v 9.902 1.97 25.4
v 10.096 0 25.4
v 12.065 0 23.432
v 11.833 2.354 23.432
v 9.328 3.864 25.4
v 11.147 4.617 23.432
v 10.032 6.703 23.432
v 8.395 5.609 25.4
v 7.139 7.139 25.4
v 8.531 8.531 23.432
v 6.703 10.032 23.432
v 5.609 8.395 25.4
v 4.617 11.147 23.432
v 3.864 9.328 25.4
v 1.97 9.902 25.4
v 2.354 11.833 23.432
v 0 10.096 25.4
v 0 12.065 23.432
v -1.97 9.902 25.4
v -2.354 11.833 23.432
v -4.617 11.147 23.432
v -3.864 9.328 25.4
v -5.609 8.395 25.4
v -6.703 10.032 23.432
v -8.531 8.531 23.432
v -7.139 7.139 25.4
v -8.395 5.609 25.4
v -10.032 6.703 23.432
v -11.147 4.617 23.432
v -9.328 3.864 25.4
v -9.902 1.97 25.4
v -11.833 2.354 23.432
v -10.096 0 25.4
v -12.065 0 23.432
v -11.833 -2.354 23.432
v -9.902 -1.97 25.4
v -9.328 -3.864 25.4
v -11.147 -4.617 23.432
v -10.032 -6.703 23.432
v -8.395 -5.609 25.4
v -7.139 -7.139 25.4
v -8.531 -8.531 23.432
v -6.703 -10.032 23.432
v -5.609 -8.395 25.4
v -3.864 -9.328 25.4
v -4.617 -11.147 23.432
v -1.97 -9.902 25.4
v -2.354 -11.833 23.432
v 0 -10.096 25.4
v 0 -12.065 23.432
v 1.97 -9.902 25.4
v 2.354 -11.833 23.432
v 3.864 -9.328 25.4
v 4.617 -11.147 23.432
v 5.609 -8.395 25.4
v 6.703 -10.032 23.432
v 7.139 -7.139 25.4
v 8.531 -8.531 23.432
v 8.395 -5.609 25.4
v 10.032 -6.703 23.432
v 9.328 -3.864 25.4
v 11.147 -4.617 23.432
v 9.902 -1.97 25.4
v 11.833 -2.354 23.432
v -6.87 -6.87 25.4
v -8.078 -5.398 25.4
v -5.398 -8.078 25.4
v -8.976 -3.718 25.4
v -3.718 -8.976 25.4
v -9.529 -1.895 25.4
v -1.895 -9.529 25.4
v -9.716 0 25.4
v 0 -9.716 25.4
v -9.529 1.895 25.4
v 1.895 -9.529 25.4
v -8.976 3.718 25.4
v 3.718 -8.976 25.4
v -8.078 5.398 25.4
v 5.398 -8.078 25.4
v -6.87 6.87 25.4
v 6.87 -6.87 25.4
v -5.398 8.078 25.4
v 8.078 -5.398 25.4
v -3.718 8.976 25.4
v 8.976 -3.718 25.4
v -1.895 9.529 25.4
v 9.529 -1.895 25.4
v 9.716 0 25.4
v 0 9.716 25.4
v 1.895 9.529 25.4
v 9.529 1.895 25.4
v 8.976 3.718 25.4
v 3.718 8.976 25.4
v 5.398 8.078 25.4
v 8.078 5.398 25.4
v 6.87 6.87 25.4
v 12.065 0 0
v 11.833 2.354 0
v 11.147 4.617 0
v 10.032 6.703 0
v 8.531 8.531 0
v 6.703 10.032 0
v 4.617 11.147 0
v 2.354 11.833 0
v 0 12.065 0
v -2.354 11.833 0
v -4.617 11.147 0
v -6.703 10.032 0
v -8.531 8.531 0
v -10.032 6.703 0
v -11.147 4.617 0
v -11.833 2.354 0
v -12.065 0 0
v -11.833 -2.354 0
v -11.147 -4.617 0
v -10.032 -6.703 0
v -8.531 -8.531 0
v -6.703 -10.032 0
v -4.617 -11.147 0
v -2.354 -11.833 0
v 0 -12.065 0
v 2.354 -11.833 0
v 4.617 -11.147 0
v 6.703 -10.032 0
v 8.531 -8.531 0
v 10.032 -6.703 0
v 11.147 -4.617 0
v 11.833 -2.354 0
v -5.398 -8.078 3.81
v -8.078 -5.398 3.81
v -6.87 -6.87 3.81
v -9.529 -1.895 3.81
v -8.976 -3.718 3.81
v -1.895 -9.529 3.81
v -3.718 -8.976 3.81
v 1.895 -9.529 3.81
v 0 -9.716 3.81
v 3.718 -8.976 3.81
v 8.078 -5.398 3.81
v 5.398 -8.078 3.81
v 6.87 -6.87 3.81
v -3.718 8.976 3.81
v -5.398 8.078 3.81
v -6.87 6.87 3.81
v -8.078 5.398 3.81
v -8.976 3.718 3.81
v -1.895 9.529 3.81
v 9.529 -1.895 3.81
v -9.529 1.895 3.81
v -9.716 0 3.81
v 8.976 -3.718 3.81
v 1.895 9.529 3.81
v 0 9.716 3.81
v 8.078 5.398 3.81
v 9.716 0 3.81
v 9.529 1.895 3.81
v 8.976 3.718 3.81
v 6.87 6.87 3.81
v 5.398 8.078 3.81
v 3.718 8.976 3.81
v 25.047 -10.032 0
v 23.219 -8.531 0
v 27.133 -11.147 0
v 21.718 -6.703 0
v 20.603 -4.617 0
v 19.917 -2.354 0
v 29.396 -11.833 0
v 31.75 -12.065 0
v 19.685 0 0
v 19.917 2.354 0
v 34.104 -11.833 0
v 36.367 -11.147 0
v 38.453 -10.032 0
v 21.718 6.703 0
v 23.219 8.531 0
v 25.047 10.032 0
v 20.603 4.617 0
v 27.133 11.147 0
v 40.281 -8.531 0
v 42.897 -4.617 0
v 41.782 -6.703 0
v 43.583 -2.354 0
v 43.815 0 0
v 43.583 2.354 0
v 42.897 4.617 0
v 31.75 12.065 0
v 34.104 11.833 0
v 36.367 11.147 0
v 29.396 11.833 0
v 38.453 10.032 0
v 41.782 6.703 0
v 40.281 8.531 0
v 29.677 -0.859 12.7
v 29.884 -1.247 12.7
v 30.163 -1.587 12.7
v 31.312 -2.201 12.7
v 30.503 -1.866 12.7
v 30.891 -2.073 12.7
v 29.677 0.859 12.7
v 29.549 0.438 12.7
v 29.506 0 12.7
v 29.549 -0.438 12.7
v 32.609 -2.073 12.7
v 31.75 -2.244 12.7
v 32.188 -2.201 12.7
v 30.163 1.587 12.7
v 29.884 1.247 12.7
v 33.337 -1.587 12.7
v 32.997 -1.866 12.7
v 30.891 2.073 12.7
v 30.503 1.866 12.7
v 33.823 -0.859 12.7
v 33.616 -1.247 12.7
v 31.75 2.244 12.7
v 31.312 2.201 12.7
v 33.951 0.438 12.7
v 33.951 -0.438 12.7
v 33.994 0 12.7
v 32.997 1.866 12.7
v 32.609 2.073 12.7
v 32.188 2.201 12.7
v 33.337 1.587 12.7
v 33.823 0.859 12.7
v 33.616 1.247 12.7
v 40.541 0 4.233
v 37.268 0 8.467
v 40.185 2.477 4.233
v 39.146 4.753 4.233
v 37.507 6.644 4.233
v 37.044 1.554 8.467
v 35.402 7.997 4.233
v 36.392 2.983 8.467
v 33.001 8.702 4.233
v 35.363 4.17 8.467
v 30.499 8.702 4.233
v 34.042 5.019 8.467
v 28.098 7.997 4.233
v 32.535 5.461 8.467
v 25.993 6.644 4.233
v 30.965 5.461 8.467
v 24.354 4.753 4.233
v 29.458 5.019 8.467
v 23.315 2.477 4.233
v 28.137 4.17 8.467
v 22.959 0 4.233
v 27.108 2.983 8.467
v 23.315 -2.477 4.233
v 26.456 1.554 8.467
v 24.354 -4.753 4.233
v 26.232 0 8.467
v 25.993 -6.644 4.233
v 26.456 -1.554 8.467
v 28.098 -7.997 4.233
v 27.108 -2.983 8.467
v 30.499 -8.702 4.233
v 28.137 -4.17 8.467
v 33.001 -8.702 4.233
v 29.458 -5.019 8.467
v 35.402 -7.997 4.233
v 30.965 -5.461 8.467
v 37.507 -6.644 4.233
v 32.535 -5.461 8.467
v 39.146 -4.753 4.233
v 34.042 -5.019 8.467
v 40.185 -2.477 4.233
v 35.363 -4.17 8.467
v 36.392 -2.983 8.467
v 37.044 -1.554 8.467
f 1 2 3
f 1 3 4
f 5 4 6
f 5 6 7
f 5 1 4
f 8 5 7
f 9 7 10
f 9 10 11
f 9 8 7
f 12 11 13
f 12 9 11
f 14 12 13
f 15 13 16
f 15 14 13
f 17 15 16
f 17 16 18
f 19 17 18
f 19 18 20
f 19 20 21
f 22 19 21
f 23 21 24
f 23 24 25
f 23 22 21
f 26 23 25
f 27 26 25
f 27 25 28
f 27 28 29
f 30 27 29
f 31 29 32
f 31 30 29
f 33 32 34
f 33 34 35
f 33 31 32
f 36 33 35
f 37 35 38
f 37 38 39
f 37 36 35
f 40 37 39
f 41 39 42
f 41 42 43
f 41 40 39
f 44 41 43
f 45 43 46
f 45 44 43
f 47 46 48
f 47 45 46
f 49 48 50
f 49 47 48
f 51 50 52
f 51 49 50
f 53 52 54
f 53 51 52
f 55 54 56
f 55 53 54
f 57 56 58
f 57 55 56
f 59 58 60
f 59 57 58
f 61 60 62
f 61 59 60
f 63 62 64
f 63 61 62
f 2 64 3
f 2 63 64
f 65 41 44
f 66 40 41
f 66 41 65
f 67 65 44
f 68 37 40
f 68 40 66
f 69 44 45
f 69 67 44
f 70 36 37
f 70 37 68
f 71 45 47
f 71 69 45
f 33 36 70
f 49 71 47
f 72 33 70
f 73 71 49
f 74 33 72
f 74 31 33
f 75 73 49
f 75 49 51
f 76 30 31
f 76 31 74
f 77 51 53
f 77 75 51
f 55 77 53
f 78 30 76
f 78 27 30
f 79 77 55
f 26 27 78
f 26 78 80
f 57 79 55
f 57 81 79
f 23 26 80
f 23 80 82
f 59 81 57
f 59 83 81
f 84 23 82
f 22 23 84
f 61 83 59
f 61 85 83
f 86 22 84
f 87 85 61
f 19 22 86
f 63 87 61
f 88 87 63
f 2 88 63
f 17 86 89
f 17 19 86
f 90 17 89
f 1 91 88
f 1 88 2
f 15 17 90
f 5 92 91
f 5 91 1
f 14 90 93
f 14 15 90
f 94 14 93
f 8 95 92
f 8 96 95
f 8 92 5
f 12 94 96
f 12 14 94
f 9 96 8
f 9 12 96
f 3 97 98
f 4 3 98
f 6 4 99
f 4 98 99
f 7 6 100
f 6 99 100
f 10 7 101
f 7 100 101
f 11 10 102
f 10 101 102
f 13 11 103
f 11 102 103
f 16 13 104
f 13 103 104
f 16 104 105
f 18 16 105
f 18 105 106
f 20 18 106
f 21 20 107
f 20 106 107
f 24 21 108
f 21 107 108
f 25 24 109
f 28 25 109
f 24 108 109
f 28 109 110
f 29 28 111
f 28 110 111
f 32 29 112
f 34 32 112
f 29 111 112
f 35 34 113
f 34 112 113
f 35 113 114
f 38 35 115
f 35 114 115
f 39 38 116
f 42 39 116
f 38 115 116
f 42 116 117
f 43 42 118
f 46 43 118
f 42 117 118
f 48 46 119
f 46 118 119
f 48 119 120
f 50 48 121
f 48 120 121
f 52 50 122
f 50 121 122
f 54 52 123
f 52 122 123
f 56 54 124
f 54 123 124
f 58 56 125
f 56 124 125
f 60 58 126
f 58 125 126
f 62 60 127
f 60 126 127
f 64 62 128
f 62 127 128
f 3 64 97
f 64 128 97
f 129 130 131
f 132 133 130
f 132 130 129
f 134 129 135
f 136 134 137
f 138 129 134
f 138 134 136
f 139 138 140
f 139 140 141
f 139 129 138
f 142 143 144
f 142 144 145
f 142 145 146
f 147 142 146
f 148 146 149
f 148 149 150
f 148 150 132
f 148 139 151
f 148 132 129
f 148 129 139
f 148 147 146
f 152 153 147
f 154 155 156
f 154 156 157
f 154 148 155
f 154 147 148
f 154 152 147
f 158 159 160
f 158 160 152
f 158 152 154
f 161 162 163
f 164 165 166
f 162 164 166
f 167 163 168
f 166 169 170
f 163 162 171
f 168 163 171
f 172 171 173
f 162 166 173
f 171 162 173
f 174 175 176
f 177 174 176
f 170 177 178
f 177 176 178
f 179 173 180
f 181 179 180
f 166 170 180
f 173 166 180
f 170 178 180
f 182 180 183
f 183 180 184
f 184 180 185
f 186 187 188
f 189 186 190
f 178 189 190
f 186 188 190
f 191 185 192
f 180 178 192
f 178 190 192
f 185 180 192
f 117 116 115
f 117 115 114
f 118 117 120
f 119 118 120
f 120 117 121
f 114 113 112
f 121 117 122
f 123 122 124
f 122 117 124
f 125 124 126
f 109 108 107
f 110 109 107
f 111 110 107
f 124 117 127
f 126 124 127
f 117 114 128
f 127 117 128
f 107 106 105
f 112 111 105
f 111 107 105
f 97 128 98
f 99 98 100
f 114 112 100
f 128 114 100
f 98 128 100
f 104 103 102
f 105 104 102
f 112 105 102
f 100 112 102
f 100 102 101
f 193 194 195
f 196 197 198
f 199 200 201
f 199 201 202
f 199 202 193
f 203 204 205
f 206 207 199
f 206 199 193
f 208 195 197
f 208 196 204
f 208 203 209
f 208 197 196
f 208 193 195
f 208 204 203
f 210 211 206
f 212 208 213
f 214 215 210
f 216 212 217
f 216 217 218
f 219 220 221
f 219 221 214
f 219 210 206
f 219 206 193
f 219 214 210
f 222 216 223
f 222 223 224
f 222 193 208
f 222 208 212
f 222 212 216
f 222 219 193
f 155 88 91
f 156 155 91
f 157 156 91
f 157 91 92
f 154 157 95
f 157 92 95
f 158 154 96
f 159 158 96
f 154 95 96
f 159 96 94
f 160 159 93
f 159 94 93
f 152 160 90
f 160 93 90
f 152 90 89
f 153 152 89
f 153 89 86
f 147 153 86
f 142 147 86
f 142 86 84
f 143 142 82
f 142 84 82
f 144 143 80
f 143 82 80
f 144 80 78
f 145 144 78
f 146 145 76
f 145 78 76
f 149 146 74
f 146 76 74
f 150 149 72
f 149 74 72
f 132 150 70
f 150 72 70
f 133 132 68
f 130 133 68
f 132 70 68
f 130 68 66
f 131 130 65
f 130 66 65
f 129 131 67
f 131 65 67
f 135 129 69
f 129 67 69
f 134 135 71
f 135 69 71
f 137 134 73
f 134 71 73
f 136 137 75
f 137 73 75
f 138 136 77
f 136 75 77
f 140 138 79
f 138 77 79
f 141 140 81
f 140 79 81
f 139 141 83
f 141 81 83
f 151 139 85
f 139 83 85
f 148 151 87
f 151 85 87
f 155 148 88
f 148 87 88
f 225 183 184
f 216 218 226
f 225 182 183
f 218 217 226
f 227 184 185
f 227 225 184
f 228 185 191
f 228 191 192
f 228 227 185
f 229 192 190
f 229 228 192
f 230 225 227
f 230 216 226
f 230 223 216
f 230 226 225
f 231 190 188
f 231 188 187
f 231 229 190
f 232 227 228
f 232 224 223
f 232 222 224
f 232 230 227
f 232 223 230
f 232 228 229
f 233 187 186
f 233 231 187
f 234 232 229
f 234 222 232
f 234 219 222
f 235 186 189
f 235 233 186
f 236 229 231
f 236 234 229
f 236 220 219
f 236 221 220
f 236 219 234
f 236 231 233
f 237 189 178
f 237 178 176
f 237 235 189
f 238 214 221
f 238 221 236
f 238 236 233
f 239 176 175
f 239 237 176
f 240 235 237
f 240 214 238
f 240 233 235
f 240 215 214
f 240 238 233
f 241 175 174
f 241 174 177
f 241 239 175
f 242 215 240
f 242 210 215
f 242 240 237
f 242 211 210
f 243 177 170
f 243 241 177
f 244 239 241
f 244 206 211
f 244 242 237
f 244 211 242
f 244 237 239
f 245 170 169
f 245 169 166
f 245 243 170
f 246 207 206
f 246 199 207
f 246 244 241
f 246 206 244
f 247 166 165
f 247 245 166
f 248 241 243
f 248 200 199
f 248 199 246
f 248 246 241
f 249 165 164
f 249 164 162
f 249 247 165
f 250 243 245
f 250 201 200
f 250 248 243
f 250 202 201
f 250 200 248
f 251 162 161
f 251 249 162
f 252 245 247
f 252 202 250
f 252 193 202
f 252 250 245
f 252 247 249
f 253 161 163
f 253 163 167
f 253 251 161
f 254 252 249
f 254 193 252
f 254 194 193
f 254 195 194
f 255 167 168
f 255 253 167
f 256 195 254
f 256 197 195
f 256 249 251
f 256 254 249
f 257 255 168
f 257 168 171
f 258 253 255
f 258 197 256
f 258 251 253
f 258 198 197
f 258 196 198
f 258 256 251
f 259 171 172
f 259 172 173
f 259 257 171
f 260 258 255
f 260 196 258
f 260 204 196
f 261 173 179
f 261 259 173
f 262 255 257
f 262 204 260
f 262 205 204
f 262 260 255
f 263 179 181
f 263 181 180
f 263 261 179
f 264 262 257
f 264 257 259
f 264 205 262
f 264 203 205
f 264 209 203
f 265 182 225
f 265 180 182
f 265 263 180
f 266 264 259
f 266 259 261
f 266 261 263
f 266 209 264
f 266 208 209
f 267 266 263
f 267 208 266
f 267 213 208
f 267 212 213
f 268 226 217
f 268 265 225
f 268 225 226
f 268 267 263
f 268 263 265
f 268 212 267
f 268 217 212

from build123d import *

# Parameters (mm, degrees)
F0_R     = 12.065
F1_DEPTH = 25.4
F2_R     = 9.7155
F3_DEPTH = 21.59
F4_R     = 12.065
F6_R     = 2.243785
F8_SIZE  = 1.9685


with BuildPart() as f1:
    # F0 (on Top) → F1 (new body)
    with BuildSketch(Plane.XY):
        Circle(F0_R)
    extrude(amount=F1_DEPTH)

    # F2 (on face) → F3 (cut)
    with BuildSketch(Plane.XY.offset(25.4)):
        Circle(F2_R)
    extrude(amount=-F3_DEPTH, mode=Mode.SUBTRACT)

    # F8
    f8_edges = [f1.edges().sort_by_distance(p)[0] for p in [
        (-12.065, 0, 25.4),
    ]]
    chamfer(f8_edges, length=F8_SIZE)


with BuildPart() as f7:
    # F4 (on Top) → F7 section 0
    with BuildSketch(Plane.XY):
        with Locations((31.75, 0)):
            Circle(F4_R)
    # F6 (on offset) → F7 section 1
    with BuildSketch(Plane.XY.offset(12.7)):
        with Locations((31.75, 0)):
            Circle(F6_R)
    loft()


solid = Compound([f1.part, f7.part])
